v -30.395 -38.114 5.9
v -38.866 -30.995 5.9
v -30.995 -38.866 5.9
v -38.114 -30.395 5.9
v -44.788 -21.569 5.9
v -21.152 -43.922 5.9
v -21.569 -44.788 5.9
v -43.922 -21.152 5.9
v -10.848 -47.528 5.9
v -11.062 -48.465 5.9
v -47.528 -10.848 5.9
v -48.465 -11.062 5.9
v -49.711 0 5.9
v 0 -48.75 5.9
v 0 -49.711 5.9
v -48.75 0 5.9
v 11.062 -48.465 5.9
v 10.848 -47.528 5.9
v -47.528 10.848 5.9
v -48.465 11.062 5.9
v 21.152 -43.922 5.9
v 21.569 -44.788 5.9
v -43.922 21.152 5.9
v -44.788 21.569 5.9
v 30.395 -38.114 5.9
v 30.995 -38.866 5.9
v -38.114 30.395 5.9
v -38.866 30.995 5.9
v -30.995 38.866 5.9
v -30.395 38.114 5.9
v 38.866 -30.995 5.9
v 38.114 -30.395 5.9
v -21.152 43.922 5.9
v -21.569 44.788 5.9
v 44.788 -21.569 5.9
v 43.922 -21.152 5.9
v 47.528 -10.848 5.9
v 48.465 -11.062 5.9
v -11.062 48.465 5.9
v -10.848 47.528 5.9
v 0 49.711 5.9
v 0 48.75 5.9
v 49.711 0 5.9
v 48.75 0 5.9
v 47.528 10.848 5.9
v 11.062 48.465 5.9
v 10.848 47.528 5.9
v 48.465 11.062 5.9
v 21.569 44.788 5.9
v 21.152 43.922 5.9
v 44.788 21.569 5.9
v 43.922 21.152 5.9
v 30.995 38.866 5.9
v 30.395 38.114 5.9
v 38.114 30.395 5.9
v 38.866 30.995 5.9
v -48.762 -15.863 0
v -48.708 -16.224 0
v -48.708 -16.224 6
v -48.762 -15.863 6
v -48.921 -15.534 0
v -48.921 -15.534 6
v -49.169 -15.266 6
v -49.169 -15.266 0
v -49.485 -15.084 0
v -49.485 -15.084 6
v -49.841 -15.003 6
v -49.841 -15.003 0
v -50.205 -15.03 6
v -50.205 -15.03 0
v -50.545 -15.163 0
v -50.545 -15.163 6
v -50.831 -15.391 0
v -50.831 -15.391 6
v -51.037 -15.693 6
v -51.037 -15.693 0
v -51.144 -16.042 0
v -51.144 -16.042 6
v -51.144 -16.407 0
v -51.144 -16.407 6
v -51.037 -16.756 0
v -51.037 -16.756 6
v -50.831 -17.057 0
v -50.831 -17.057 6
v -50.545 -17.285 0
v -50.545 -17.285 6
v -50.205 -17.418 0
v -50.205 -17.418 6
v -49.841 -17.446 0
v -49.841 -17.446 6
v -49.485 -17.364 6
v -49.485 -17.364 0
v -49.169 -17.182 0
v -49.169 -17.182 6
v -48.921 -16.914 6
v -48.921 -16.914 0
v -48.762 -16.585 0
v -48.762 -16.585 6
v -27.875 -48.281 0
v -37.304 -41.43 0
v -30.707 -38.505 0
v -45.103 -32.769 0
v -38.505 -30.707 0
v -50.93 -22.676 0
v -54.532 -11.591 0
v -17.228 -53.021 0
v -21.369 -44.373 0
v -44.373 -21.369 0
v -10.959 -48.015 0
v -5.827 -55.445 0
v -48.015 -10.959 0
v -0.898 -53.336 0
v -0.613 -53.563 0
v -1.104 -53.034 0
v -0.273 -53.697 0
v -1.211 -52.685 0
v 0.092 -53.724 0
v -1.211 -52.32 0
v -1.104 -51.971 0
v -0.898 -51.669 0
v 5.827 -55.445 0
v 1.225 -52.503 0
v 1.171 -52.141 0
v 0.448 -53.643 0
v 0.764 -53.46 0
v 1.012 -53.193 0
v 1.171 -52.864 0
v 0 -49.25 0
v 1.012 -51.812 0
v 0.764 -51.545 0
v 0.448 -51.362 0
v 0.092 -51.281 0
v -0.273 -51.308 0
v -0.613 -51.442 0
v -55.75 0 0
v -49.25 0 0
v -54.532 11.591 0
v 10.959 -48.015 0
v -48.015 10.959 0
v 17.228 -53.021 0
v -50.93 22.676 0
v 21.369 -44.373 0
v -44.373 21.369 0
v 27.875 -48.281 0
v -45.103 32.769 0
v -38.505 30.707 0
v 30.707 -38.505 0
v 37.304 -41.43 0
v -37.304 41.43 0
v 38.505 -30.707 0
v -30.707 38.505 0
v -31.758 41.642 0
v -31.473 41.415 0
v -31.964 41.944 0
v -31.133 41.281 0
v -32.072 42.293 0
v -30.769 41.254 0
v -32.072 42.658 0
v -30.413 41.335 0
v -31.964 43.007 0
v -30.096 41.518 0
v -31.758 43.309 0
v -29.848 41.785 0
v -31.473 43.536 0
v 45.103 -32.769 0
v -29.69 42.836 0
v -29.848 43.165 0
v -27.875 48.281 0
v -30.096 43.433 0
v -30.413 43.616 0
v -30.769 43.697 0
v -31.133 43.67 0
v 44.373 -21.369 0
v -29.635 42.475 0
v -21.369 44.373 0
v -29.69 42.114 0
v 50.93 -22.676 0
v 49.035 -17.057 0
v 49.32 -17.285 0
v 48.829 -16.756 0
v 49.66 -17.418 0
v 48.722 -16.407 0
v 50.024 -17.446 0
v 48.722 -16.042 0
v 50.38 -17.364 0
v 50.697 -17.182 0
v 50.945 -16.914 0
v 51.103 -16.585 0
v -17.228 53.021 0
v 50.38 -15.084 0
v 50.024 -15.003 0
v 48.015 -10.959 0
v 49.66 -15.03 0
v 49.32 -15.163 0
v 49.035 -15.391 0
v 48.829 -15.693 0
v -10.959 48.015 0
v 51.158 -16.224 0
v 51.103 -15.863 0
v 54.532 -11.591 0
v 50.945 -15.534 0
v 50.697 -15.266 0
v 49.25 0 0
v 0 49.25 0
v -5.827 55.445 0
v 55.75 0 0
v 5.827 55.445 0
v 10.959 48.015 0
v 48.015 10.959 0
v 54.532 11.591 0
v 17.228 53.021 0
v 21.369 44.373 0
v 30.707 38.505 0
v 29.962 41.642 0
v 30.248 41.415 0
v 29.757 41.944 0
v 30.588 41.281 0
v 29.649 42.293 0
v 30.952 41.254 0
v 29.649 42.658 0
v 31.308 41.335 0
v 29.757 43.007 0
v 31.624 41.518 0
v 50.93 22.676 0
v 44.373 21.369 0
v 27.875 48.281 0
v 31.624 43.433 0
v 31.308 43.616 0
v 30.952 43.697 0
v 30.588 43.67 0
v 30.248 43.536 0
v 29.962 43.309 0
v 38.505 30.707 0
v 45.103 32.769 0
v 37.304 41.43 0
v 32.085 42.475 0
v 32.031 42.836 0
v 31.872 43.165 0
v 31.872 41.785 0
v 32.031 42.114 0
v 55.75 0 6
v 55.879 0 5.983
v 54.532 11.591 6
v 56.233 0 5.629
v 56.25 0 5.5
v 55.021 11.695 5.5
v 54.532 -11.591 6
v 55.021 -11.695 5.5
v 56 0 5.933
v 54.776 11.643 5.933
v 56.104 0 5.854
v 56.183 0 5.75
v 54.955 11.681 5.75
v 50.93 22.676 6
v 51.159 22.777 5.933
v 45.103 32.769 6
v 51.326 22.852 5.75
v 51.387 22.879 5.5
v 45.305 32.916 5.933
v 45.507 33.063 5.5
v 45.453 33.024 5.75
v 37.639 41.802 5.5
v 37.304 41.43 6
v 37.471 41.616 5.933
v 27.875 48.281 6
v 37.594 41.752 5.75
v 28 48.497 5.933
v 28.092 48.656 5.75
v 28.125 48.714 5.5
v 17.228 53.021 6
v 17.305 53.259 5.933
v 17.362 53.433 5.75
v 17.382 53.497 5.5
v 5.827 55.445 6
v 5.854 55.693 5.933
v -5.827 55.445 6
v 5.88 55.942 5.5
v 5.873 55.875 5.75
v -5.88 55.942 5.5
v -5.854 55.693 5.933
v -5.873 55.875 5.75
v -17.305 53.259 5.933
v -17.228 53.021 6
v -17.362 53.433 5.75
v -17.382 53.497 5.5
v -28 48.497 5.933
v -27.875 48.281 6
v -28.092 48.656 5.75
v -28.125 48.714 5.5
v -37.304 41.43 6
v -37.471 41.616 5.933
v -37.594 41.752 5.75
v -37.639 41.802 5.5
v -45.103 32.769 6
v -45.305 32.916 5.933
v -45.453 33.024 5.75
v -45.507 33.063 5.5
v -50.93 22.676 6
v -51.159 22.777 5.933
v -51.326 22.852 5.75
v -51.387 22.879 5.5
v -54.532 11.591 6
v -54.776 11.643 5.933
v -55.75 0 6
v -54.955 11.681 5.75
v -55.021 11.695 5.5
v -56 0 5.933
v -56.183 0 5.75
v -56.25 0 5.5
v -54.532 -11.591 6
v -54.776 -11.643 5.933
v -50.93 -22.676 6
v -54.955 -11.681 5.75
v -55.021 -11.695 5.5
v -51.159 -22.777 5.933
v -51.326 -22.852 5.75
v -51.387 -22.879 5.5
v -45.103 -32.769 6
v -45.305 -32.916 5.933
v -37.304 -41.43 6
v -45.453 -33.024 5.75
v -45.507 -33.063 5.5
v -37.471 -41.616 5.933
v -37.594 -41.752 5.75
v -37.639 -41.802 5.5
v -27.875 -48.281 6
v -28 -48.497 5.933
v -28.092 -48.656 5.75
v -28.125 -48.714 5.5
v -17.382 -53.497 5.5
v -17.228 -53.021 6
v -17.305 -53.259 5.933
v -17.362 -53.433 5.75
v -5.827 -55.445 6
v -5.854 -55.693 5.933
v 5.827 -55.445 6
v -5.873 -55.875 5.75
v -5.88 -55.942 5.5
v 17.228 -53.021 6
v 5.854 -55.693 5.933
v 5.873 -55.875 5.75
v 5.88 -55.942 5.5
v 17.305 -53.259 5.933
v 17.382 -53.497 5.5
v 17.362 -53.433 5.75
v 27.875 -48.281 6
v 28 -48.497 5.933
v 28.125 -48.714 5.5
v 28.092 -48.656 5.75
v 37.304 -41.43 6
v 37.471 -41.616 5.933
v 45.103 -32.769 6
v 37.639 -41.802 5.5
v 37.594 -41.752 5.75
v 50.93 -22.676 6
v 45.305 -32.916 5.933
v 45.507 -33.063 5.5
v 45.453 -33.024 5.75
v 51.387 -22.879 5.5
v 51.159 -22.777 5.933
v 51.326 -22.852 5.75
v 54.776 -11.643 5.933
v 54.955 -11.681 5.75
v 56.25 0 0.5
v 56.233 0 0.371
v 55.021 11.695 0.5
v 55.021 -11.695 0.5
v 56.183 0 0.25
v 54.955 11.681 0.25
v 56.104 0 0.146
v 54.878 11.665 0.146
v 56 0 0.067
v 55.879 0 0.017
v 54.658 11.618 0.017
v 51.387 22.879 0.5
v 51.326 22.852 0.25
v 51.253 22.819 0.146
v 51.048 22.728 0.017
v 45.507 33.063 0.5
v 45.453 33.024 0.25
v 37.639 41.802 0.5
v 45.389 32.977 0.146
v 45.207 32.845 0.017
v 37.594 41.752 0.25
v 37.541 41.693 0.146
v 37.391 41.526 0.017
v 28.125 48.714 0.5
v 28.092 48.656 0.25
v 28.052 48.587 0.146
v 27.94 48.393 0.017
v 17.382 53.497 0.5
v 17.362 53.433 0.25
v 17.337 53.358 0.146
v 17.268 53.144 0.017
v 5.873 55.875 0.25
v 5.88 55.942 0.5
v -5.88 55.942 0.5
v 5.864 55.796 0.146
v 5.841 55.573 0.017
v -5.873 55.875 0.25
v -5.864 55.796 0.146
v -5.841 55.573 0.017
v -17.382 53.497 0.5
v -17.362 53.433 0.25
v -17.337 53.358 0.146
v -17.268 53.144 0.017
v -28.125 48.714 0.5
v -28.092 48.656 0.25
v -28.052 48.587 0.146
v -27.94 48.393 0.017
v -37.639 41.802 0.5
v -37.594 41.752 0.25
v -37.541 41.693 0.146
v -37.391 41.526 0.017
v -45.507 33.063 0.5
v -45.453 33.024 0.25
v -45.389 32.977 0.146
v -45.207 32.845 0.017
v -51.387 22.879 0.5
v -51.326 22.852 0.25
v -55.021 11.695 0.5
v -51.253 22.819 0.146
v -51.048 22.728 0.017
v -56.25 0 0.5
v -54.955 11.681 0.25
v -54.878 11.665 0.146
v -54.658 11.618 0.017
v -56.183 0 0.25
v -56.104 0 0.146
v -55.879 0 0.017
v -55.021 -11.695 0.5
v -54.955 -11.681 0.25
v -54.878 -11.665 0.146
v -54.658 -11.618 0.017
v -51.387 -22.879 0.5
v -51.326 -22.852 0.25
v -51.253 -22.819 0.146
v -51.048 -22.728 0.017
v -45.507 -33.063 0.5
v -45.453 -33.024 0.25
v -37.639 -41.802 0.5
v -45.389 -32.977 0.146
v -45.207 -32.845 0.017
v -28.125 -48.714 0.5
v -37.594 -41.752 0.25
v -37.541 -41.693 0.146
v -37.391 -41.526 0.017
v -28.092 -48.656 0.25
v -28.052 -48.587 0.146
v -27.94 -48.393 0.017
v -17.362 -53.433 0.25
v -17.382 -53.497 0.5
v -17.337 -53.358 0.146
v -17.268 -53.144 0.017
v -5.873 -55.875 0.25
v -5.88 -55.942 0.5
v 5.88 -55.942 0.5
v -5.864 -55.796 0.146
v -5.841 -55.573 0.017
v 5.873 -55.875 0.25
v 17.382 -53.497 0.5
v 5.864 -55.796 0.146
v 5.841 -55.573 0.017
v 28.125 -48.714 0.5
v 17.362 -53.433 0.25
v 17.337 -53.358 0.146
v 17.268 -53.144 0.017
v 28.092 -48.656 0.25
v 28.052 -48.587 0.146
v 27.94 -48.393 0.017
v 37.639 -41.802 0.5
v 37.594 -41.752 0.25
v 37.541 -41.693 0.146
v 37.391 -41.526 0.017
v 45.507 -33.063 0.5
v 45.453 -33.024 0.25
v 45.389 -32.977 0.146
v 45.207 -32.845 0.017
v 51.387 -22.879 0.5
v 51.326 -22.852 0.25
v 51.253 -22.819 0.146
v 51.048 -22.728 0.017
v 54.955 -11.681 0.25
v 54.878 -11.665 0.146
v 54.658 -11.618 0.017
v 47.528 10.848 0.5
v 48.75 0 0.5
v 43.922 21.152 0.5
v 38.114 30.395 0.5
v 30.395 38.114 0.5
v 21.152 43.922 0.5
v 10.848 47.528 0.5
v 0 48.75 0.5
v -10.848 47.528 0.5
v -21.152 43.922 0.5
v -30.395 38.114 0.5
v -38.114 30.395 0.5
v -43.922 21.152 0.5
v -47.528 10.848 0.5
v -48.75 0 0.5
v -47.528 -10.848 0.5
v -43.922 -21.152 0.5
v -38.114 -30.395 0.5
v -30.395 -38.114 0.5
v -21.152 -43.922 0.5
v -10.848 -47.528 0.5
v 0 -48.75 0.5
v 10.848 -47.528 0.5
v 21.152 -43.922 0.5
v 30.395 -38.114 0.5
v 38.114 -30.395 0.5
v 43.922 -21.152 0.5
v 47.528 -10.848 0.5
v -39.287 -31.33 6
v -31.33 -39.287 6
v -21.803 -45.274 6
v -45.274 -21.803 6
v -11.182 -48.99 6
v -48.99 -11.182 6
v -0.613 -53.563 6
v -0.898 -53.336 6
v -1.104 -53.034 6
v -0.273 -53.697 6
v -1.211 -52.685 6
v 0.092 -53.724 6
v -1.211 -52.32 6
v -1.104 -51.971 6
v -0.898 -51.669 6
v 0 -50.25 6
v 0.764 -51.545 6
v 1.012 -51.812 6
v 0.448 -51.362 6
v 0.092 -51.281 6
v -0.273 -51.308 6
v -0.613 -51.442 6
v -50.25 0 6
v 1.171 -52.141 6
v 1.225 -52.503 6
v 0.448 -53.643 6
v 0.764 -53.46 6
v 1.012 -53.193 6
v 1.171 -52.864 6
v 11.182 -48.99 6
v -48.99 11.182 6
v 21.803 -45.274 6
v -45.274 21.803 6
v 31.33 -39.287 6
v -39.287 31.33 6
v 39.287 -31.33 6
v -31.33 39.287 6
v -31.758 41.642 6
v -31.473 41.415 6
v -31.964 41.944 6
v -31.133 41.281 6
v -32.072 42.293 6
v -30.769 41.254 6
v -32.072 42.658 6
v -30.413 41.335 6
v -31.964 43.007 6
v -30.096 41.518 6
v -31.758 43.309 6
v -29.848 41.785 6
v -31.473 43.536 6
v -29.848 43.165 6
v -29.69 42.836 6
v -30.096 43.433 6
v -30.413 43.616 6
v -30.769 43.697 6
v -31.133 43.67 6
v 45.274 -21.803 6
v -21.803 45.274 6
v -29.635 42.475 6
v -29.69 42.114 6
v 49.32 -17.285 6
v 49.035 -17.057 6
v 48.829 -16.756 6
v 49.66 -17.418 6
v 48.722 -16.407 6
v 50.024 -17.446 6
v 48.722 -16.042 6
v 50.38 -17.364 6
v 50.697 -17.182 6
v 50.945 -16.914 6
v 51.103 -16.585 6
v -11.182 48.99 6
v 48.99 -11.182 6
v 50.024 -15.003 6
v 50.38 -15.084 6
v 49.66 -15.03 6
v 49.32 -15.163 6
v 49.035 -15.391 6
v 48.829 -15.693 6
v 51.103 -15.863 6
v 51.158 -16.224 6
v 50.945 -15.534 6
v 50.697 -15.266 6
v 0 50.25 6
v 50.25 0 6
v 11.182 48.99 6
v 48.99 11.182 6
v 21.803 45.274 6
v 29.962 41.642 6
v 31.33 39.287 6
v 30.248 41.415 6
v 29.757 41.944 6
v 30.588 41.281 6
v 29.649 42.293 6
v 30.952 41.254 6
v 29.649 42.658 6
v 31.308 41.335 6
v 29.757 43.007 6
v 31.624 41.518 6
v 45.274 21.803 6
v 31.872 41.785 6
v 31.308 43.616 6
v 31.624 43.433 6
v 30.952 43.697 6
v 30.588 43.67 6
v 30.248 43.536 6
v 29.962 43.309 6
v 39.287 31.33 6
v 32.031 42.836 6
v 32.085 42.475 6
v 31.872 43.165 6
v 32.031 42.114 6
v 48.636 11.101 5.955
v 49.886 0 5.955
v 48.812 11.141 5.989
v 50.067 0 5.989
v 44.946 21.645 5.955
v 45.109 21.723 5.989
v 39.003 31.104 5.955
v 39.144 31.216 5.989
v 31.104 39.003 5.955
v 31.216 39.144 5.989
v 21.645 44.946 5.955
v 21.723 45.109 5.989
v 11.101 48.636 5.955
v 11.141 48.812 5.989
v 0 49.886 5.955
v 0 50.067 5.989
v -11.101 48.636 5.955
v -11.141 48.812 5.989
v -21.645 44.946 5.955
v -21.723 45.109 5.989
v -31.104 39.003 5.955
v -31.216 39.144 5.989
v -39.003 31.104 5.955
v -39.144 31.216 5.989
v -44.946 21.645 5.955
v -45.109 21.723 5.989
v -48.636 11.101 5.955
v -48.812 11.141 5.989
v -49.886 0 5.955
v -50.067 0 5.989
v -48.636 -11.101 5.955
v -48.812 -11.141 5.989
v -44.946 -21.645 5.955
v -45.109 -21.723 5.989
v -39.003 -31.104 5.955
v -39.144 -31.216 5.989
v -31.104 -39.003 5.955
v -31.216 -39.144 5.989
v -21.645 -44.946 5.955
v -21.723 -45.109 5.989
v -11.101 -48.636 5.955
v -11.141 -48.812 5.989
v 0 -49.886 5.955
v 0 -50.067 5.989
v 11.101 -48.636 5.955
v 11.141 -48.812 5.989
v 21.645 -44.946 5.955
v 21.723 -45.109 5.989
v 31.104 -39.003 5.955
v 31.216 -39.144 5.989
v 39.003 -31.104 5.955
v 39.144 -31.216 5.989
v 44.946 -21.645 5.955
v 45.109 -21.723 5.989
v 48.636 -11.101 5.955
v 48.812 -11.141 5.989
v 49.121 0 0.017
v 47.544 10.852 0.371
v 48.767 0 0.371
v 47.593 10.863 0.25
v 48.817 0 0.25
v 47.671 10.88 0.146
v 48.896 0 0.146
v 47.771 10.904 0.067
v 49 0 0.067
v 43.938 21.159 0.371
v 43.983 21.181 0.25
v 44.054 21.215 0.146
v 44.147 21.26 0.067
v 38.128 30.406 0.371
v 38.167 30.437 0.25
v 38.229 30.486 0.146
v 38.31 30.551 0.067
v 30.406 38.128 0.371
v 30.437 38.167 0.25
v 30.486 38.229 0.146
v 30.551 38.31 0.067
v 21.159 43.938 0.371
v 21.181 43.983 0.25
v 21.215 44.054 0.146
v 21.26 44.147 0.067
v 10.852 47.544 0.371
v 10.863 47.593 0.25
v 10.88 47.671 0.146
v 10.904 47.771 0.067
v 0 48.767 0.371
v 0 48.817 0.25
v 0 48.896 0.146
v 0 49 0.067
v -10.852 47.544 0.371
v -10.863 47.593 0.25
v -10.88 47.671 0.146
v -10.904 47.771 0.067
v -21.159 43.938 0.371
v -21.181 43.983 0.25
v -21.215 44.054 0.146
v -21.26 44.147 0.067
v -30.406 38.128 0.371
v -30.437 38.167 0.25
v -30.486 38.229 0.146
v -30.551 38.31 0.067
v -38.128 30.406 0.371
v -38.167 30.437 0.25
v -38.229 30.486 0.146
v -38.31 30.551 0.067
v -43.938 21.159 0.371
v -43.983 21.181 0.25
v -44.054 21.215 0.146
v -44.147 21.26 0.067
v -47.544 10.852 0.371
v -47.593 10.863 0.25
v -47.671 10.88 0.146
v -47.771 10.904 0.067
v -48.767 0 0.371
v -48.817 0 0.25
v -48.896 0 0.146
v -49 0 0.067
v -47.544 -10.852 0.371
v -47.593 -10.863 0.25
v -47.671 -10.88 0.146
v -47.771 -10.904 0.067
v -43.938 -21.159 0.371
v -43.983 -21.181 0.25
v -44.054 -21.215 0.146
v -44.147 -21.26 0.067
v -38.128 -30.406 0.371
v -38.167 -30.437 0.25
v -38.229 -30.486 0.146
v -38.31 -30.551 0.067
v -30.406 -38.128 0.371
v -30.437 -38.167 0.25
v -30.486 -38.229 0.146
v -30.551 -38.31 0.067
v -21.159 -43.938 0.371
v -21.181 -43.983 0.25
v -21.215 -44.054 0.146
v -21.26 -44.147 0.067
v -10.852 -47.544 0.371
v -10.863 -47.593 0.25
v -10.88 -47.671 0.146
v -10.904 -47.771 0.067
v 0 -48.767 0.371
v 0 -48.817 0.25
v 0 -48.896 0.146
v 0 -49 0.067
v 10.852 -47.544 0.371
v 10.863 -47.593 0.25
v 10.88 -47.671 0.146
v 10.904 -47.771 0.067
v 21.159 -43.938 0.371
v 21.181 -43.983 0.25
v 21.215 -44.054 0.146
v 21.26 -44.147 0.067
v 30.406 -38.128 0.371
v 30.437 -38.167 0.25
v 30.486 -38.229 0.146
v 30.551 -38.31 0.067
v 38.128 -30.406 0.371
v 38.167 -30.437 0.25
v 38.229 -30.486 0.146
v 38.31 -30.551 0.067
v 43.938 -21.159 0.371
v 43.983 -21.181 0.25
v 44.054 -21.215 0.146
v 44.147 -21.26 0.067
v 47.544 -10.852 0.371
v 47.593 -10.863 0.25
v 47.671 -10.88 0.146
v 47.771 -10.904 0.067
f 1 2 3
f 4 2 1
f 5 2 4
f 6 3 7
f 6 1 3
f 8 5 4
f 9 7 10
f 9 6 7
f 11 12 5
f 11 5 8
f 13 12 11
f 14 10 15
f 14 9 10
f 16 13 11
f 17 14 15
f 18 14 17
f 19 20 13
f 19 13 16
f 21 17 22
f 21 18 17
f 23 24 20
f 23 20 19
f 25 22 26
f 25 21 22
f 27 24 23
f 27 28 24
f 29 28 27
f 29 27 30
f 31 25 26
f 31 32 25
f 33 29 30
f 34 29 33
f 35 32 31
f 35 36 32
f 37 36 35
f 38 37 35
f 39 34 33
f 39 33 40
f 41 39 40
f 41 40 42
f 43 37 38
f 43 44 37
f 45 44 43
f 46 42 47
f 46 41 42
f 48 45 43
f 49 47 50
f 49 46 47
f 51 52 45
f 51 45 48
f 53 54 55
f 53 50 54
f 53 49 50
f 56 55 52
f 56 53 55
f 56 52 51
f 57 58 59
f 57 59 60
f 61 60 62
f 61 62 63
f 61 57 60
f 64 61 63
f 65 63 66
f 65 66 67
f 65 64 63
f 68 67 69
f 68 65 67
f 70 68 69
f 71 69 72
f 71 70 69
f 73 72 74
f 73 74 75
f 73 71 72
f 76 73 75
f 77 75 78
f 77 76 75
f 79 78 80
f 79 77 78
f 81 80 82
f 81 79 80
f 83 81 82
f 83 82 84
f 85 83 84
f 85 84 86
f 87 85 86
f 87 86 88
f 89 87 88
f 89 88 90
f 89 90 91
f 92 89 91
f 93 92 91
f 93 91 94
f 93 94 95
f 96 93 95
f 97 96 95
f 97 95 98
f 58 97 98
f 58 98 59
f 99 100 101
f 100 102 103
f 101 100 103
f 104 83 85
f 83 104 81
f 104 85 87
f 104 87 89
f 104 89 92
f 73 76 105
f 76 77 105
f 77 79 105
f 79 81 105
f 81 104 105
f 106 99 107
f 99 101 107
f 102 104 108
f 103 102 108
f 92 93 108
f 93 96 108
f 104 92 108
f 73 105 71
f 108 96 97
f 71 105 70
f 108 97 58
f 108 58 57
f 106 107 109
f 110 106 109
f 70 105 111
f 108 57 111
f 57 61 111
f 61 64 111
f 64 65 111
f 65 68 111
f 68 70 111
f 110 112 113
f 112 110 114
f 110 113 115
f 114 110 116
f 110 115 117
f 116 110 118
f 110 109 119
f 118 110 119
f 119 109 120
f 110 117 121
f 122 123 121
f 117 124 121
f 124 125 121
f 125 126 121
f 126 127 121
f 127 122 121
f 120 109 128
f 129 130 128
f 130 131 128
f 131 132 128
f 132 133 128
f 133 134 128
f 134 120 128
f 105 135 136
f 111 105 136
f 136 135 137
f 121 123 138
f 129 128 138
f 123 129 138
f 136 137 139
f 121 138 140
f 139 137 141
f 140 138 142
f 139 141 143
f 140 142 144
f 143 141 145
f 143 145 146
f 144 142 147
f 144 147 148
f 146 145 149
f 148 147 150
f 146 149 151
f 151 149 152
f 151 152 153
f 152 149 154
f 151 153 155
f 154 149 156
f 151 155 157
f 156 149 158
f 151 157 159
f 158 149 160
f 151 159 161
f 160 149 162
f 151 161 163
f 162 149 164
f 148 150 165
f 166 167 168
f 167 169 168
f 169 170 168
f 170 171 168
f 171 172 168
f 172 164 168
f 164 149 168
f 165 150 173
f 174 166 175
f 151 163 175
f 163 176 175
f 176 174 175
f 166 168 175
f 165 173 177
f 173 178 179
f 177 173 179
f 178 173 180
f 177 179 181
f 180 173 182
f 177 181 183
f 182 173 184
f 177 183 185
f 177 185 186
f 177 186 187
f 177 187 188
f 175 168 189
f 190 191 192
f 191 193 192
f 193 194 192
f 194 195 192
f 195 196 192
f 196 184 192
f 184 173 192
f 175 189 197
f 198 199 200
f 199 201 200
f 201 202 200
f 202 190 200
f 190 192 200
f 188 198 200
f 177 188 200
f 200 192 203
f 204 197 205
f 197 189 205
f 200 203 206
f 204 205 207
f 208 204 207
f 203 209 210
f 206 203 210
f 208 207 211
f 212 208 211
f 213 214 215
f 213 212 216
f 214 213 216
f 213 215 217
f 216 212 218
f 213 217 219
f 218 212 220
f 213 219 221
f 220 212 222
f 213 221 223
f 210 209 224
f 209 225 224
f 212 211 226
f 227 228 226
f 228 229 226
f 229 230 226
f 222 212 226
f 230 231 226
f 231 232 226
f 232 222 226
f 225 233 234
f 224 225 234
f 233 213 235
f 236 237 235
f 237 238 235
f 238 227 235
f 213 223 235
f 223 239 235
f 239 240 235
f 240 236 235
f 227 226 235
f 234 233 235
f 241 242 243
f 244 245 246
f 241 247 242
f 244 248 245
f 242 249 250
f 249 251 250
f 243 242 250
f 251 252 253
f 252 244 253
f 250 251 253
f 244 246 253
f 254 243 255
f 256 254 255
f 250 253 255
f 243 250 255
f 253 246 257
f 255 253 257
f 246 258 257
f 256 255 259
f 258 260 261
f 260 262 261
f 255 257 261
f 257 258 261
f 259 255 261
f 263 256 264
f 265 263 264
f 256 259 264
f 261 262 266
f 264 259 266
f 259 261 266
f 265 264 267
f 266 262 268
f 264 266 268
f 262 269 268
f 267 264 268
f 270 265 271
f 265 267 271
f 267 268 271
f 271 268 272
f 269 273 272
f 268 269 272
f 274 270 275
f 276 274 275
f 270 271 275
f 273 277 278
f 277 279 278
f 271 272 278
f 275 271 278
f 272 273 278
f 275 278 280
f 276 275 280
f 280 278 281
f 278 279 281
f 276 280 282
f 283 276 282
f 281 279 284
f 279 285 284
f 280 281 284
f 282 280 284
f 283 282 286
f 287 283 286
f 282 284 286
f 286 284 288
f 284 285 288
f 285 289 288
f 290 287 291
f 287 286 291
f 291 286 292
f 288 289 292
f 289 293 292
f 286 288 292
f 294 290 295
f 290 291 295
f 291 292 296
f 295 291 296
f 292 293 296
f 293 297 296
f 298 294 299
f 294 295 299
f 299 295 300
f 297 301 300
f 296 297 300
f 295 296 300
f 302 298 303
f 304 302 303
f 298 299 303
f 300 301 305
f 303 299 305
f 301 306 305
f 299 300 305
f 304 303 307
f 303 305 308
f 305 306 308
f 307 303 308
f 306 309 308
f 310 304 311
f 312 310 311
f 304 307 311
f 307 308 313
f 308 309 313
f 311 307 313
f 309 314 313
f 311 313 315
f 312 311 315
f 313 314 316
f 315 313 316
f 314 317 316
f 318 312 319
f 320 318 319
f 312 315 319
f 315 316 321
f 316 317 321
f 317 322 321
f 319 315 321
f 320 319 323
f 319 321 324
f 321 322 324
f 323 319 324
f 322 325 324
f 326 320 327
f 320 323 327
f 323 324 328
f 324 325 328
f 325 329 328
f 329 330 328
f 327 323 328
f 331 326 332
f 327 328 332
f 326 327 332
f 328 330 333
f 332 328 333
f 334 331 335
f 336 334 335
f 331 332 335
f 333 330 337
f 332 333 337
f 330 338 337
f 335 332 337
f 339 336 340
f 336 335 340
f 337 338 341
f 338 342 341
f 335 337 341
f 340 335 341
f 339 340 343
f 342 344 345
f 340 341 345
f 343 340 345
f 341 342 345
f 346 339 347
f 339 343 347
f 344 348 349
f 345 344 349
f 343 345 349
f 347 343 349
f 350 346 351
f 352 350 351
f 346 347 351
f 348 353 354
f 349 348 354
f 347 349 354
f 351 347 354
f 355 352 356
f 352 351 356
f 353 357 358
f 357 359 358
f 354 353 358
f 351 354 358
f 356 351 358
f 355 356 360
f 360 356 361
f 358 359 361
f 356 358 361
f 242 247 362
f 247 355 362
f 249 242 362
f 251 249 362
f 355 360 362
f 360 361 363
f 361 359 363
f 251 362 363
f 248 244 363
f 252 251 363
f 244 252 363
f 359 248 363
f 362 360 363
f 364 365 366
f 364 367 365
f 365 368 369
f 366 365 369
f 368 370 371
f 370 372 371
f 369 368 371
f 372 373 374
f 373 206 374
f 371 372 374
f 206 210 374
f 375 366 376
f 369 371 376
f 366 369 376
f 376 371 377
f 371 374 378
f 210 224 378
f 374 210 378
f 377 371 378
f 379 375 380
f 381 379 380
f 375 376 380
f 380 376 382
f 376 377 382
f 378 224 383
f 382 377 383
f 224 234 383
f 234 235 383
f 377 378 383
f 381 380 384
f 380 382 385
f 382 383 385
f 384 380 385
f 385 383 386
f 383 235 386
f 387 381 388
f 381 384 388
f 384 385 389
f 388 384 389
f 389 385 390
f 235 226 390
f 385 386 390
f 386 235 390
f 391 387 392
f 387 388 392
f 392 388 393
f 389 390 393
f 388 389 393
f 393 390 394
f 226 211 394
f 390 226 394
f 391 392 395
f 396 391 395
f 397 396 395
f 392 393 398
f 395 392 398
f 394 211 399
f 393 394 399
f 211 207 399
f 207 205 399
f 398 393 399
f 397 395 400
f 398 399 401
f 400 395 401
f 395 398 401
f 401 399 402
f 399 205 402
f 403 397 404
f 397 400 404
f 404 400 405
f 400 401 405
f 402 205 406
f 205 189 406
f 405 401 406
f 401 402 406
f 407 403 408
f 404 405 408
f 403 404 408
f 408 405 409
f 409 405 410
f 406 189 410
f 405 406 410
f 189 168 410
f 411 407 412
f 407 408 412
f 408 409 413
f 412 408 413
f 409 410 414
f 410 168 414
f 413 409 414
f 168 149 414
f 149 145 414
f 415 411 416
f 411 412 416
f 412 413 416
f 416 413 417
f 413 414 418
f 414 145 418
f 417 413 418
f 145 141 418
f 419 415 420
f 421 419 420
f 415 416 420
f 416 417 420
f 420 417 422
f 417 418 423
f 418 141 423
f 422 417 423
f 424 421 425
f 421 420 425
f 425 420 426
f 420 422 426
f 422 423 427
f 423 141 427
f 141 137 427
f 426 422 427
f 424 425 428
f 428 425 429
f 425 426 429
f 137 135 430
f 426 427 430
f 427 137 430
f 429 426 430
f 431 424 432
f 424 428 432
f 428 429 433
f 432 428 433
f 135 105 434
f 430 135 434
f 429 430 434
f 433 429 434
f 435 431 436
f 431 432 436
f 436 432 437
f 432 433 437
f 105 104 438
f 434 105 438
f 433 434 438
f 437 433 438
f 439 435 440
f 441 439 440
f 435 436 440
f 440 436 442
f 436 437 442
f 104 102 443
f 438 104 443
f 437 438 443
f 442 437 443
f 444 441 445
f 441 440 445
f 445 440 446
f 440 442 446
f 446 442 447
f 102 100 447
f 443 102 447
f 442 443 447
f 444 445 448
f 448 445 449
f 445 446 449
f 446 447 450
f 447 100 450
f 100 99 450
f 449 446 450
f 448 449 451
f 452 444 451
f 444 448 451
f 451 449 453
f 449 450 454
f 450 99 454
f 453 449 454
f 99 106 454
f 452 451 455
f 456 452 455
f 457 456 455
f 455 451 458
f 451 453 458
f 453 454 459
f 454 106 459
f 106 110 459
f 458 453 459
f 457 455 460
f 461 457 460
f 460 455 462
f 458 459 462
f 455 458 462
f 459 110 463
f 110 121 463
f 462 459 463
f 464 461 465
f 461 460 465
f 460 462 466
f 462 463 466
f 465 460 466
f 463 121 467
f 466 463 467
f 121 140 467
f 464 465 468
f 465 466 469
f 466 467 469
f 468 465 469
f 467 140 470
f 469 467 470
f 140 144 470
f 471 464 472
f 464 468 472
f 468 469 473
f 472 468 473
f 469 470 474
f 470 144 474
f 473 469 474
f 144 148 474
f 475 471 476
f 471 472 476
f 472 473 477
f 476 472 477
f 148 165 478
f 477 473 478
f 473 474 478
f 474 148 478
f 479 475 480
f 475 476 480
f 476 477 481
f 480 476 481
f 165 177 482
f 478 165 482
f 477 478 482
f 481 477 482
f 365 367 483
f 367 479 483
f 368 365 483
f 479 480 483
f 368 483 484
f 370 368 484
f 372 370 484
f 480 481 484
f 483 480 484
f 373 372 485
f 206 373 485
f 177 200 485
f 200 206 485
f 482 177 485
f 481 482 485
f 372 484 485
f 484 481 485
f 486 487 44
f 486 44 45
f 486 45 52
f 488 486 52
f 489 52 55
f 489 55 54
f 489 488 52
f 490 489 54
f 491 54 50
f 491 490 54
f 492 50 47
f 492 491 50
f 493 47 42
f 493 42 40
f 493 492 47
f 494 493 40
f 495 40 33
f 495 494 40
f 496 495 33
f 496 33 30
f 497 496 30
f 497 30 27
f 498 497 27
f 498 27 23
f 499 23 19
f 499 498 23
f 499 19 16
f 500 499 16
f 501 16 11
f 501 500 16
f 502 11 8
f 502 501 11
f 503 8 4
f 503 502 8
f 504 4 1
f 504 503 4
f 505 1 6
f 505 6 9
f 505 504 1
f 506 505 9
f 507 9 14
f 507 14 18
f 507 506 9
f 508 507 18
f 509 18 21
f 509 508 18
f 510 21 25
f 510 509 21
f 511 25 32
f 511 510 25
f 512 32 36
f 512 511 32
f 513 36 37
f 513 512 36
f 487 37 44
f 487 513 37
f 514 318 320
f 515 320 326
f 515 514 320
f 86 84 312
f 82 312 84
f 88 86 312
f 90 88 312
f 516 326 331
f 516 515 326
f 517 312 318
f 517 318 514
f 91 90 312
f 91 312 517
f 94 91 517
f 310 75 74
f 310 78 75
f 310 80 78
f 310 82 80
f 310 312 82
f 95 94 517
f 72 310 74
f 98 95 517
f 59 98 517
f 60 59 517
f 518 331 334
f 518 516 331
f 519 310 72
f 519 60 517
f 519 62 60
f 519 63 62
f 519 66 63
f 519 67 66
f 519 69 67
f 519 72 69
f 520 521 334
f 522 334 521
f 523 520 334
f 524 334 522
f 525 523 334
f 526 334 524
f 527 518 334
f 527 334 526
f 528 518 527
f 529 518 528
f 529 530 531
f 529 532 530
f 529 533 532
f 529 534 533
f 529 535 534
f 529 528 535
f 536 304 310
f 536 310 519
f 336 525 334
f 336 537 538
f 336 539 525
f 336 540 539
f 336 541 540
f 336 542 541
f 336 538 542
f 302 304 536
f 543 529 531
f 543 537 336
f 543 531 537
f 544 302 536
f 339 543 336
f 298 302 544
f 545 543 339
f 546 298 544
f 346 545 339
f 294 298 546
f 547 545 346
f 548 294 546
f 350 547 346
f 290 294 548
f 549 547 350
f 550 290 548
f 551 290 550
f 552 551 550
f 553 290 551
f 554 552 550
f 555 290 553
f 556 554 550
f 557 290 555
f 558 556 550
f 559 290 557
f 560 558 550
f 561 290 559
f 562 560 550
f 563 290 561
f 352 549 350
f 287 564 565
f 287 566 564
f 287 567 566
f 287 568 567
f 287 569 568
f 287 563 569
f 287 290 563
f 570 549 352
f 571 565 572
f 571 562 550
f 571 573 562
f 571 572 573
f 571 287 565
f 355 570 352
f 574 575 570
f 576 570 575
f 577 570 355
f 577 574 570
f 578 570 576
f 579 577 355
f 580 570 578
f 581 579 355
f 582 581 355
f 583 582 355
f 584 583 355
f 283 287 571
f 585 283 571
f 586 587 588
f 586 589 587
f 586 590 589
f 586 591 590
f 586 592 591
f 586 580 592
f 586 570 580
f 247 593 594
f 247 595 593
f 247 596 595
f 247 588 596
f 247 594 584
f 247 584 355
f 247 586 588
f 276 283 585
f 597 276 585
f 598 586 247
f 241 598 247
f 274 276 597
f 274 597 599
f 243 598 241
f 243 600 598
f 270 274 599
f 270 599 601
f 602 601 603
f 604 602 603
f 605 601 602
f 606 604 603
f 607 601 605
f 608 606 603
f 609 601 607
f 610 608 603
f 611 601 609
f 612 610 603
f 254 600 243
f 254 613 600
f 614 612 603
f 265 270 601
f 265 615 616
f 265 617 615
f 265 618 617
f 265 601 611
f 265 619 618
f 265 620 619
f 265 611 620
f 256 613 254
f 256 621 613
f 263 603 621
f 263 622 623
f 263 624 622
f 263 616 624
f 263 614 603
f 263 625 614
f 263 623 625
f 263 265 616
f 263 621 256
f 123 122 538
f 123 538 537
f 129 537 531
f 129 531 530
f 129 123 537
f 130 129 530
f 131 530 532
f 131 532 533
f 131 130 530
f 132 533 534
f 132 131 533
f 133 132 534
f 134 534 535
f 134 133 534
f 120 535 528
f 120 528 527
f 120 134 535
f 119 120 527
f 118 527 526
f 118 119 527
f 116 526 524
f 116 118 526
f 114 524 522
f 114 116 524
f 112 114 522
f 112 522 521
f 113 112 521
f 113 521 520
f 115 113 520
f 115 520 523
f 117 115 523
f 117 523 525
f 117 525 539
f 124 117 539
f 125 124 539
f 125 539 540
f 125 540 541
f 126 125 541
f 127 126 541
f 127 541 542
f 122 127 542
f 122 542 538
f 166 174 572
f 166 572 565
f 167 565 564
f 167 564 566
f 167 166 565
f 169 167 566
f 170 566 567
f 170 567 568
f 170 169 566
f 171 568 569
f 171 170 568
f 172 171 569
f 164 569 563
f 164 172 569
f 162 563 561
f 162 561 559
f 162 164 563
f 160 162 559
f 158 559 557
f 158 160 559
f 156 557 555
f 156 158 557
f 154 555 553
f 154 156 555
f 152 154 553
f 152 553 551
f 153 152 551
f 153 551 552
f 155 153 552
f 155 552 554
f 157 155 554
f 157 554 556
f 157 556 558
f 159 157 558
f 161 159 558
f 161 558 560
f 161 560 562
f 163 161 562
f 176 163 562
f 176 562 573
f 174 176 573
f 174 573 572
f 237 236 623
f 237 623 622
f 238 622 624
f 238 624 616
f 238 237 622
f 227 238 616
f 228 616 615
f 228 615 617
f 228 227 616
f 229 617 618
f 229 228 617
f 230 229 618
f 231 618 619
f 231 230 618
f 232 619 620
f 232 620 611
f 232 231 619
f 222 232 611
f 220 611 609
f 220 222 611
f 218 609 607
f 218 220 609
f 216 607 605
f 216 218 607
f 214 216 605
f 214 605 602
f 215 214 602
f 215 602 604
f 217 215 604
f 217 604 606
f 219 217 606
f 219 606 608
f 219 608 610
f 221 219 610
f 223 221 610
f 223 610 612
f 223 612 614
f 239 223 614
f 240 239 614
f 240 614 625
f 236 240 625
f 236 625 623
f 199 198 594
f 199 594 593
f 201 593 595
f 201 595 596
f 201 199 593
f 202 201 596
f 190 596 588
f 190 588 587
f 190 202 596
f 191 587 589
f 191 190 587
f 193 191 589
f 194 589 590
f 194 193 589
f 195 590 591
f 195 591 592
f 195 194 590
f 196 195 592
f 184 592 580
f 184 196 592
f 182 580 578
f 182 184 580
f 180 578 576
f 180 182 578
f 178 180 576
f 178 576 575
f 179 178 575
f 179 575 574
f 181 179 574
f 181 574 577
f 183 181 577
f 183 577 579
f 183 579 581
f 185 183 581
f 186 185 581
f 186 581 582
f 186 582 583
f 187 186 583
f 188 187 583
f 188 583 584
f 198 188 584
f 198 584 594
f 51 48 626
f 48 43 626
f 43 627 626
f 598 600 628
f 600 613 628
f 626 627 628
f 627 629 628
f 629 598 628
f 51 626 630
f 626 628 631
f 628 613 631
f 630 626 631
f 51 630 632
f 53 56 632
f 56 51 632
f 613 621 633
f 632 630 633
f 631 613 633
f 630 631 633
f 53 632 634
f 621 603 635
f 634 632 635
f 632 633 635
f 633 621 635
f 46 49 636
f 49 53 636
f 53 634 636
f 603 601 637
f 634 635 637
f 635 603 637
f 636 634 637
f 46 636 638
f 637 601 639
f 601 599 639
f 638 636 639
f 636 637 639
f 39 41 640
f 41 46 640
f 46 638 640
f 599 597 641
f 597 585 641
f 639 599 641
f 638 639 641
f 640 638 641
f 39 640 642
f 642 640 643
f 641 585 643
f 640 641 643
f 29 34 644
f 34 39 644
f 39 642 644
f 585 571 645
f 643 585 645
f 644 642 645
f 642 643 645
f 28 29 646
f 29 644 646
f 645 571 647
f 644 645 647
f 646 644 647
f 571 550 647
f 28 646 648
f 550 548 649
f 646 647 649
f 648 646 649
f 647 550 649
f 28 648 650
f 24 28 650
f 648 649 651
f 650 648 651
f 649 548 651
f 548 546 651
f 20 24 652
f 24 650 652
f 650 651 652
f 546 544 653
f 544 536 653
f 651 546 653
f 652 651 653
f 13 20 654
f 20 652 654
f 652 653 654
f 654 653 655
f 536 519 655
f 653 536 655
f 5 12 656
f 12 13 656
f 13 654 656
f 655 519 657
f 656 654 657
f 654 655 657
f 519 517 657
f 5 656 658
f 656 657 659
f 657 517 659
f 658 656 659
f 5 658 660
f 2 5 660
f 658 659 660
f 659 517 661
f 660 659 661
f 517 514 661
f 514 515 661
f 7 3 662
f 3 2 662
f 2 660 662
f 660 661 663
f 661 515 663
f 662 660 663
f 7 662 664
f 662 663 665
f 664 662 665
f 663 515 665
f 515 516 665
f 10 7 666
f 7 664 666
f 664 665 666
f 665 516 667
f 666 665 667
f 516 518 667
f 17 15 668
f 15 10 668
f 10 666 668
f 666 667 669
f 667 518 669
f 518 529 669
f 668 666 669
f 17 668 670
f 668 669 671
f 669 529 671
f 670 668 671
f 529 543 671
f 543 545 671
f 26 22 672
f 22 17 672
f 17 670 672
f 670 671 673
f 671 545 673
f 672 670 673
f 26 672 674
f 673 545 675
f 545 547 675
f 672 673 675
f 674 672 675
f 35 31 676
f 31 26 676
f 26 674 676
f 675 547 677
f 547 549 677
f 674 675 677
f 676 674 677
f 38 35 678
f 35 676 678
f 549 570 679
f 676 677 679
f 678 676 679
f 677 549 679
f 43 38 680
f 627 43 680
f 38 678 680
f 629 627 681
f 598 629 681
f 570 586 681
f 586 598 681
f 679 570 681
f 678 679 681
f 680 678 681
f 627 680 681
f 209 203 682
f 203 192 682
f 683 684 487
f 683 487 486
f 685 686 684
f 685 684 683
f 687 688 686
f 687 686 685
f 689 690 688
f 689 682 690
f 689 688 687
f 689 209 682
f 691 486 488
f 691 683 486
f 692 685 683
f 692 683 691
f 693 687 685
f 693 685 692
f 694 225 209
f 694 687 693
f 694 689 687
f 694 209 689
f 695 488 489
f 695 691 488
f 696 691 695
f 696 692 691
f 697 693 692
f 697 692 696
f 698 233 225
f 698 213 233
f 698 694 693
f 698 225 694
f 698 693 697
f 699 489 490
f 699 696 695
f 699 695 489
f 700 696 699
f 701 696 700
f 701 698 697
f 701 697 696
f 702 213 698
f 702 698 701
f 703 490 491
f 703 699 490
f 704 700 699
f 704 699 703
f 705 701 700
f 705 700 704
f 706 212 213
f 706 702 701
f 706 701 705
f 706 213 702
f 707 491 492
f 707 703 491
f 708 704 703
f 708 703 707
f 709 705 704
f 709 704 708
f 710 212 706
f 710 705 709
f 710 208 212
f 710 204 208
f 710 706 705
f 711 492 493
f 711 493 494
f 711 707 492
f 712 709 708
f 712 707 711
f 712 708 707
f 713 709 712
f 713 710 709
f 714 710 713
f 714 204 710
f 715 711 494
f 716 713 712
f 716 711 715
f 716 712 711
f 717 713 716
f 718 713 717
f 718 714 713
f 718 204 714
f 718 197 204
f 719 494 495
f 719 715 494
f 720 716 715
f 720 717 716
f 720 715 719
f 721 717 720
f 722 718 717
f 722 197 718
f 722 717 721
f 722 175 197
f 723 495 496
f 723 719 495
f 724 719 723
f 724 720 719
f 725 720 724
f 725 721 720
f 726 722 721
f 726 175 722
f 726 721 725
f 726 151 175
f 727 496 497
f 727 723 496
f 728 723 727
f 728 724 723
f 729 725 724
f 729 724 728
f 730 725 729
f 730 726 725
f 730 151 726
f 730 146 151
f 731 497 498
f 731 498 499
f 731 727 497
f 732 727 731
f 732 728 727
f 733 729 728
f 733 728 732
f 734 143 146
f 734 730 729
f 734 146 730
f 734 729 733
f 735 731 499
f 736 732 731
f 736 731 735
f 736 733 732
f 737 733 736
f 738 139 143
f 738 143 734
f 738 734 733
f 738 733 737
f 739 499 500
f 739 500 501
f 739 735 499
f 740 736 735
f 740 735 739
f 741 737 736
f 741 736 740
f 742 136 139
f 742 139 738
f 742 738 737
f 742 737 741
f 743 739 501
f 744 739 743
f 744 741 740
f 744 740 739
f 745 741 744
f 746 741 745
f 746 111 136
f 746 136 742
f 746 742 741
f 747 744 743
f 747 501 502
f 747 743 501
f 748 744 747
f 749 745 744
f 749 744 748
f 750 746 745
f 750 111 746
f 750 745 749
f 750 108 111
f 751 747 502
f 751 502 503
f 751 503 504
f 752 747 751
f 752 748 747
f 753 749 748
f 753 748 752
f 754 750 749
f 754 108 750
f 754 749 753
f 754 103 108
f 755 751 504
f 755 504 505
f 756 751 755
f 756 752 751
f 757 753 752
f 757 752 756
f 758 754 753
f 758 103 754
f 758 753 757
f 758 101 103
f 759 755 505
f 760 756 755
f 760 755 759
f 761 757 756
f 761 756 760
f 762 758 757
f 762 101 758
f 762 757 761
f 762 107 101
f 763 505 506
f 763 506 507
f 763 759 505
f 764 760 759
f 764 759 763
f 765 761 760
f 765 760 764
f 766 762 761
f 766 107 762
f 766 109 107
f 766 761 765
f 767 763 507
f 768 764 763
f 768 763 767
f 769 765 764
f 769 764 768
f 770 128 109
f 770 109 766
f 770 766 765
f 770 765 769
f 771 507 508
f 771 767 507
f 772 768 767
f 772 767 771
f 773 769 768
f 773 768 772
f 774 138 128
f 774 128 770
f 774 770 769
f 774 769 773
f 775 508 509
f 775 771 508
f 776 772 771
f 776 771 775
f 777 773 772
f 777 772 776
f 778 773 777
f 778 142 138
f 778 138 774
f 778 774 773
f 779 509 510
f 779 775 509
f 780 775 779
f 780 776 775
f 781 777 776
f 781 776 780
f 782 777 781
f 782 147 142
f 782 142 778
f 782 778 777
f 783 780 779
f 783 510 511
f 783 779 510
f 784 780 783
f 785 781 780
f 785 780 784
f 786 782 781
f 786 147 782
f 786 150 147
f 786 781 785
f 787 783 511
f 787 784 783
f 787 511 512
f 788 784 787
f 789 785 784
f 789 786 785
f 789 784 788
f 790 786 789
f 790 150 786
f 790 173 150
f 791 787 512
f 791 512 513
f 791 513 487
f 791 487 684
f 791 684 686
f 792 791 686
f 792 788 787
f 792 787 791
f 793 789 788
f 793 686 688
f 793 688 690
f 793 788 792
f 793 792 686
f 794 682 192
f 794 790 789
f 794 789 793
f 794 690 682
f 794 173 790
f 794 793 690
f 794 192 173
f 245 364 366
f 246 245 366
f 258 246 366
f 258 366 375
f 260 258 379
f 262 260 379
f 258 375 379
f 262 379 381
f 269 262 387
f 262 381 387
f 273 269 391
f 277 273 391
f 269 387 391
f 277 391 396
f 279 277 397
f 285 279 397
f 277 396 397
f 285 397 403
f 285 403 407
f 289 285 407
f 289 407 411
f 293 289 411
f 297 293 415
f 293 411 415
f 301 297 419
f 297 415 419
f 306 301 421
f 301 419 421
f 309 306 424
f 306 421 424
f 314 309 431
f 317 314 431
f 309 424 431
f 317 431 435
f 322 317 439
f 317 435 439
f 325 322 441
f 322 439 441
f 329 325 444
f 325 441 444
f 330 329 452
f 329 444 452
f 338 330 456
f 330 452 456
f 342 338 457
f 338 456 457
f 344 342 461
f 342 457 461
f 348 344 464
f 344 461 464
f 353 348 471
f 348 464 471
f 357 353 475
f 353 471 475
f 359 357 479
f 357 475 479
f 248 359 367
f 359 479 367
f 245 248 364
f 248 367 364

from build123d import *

# Parameters (mm, degrees)
F0_R     = 56.25
F0_R_2   = 1.225
F0_R_3   = 48.75
F1_DEPTH = 6
F2_R     = 1.5
F3_DEPTH = 5.9
F4_R     = 0.5


with BuildPart() as f1:
    # F0 (on Top) → F1 (new body)
    with BuildSketch(Plane.XY):
        Circle(F0_R)
        with Locations((-49.932854, -16.224168)):
            Circle(F0_R_2, mode=Mode.SUBTRACT)
        with Locations((0, -52.50251)):
            Circle(F0_R_2, mode=Mode.SUBTRACT)
        with Locations((49.932854, -16.224168)):
            Circle(F0_R_2, mode=Mode.SUBTRACT)
        with Locations((-30.860201, 42.475423)):
            Circle(F0_R_2, mode=Mode.SUBTRACT)
        Circle(F0_R_3, mode=Mode.SUBTRACT)
        with Locations((30.860201, 42.475423)):
            Circle(F0_R_2, mode=Mode.SUBTRACT)
    extrude(amount=F1_DEPTH)

    # F2
    f2_edges = [f1.edges().sort_by_distance(p)[0] for p in [
        (-48.75, 0, 6),
    ]]
    fillet(f2_edges, radius=F2_R)

    # F0 (on Top) → F3 (join)
    with BuildSketch(Plane.XY):
        Circle(F0_R)
        with Locations((-49.932854, -16.224168)):
            Circle(F0_R_2, mode=Mode.SUBTRACT)
        with Locations((0, -52.50251)):
            Circle(F0_R_2, mode=Mode.SUBTRACT)
        with Locations((49.932854, -16.224168)):
            Circle(F0_R_2, mode=Mode.SUBTRACT)
        with Locations((-30.860201, 42.475423)):
            Circle(F0_R_2, mode=Mode.SUBTRACT)
        Circle(F0_R_3, mode=Mode.SUBTRACT)
        with Locations((30.860201, 42.475423)):
            Circle(F0_R_2, mode=Mode.SUBTRACT)
    extrude(amount=F3_DEPTH)

    # F4
    f4_edges = [f1.edges().sort_by_distance(p)[0] for p in [
        (-48.75, 0, 0),
        (-56.25, 0, 0),
        (-56.25, 0, 6),
    ]]
    fillet(f4_edges, radius=F4_R)


solid = f1.part
